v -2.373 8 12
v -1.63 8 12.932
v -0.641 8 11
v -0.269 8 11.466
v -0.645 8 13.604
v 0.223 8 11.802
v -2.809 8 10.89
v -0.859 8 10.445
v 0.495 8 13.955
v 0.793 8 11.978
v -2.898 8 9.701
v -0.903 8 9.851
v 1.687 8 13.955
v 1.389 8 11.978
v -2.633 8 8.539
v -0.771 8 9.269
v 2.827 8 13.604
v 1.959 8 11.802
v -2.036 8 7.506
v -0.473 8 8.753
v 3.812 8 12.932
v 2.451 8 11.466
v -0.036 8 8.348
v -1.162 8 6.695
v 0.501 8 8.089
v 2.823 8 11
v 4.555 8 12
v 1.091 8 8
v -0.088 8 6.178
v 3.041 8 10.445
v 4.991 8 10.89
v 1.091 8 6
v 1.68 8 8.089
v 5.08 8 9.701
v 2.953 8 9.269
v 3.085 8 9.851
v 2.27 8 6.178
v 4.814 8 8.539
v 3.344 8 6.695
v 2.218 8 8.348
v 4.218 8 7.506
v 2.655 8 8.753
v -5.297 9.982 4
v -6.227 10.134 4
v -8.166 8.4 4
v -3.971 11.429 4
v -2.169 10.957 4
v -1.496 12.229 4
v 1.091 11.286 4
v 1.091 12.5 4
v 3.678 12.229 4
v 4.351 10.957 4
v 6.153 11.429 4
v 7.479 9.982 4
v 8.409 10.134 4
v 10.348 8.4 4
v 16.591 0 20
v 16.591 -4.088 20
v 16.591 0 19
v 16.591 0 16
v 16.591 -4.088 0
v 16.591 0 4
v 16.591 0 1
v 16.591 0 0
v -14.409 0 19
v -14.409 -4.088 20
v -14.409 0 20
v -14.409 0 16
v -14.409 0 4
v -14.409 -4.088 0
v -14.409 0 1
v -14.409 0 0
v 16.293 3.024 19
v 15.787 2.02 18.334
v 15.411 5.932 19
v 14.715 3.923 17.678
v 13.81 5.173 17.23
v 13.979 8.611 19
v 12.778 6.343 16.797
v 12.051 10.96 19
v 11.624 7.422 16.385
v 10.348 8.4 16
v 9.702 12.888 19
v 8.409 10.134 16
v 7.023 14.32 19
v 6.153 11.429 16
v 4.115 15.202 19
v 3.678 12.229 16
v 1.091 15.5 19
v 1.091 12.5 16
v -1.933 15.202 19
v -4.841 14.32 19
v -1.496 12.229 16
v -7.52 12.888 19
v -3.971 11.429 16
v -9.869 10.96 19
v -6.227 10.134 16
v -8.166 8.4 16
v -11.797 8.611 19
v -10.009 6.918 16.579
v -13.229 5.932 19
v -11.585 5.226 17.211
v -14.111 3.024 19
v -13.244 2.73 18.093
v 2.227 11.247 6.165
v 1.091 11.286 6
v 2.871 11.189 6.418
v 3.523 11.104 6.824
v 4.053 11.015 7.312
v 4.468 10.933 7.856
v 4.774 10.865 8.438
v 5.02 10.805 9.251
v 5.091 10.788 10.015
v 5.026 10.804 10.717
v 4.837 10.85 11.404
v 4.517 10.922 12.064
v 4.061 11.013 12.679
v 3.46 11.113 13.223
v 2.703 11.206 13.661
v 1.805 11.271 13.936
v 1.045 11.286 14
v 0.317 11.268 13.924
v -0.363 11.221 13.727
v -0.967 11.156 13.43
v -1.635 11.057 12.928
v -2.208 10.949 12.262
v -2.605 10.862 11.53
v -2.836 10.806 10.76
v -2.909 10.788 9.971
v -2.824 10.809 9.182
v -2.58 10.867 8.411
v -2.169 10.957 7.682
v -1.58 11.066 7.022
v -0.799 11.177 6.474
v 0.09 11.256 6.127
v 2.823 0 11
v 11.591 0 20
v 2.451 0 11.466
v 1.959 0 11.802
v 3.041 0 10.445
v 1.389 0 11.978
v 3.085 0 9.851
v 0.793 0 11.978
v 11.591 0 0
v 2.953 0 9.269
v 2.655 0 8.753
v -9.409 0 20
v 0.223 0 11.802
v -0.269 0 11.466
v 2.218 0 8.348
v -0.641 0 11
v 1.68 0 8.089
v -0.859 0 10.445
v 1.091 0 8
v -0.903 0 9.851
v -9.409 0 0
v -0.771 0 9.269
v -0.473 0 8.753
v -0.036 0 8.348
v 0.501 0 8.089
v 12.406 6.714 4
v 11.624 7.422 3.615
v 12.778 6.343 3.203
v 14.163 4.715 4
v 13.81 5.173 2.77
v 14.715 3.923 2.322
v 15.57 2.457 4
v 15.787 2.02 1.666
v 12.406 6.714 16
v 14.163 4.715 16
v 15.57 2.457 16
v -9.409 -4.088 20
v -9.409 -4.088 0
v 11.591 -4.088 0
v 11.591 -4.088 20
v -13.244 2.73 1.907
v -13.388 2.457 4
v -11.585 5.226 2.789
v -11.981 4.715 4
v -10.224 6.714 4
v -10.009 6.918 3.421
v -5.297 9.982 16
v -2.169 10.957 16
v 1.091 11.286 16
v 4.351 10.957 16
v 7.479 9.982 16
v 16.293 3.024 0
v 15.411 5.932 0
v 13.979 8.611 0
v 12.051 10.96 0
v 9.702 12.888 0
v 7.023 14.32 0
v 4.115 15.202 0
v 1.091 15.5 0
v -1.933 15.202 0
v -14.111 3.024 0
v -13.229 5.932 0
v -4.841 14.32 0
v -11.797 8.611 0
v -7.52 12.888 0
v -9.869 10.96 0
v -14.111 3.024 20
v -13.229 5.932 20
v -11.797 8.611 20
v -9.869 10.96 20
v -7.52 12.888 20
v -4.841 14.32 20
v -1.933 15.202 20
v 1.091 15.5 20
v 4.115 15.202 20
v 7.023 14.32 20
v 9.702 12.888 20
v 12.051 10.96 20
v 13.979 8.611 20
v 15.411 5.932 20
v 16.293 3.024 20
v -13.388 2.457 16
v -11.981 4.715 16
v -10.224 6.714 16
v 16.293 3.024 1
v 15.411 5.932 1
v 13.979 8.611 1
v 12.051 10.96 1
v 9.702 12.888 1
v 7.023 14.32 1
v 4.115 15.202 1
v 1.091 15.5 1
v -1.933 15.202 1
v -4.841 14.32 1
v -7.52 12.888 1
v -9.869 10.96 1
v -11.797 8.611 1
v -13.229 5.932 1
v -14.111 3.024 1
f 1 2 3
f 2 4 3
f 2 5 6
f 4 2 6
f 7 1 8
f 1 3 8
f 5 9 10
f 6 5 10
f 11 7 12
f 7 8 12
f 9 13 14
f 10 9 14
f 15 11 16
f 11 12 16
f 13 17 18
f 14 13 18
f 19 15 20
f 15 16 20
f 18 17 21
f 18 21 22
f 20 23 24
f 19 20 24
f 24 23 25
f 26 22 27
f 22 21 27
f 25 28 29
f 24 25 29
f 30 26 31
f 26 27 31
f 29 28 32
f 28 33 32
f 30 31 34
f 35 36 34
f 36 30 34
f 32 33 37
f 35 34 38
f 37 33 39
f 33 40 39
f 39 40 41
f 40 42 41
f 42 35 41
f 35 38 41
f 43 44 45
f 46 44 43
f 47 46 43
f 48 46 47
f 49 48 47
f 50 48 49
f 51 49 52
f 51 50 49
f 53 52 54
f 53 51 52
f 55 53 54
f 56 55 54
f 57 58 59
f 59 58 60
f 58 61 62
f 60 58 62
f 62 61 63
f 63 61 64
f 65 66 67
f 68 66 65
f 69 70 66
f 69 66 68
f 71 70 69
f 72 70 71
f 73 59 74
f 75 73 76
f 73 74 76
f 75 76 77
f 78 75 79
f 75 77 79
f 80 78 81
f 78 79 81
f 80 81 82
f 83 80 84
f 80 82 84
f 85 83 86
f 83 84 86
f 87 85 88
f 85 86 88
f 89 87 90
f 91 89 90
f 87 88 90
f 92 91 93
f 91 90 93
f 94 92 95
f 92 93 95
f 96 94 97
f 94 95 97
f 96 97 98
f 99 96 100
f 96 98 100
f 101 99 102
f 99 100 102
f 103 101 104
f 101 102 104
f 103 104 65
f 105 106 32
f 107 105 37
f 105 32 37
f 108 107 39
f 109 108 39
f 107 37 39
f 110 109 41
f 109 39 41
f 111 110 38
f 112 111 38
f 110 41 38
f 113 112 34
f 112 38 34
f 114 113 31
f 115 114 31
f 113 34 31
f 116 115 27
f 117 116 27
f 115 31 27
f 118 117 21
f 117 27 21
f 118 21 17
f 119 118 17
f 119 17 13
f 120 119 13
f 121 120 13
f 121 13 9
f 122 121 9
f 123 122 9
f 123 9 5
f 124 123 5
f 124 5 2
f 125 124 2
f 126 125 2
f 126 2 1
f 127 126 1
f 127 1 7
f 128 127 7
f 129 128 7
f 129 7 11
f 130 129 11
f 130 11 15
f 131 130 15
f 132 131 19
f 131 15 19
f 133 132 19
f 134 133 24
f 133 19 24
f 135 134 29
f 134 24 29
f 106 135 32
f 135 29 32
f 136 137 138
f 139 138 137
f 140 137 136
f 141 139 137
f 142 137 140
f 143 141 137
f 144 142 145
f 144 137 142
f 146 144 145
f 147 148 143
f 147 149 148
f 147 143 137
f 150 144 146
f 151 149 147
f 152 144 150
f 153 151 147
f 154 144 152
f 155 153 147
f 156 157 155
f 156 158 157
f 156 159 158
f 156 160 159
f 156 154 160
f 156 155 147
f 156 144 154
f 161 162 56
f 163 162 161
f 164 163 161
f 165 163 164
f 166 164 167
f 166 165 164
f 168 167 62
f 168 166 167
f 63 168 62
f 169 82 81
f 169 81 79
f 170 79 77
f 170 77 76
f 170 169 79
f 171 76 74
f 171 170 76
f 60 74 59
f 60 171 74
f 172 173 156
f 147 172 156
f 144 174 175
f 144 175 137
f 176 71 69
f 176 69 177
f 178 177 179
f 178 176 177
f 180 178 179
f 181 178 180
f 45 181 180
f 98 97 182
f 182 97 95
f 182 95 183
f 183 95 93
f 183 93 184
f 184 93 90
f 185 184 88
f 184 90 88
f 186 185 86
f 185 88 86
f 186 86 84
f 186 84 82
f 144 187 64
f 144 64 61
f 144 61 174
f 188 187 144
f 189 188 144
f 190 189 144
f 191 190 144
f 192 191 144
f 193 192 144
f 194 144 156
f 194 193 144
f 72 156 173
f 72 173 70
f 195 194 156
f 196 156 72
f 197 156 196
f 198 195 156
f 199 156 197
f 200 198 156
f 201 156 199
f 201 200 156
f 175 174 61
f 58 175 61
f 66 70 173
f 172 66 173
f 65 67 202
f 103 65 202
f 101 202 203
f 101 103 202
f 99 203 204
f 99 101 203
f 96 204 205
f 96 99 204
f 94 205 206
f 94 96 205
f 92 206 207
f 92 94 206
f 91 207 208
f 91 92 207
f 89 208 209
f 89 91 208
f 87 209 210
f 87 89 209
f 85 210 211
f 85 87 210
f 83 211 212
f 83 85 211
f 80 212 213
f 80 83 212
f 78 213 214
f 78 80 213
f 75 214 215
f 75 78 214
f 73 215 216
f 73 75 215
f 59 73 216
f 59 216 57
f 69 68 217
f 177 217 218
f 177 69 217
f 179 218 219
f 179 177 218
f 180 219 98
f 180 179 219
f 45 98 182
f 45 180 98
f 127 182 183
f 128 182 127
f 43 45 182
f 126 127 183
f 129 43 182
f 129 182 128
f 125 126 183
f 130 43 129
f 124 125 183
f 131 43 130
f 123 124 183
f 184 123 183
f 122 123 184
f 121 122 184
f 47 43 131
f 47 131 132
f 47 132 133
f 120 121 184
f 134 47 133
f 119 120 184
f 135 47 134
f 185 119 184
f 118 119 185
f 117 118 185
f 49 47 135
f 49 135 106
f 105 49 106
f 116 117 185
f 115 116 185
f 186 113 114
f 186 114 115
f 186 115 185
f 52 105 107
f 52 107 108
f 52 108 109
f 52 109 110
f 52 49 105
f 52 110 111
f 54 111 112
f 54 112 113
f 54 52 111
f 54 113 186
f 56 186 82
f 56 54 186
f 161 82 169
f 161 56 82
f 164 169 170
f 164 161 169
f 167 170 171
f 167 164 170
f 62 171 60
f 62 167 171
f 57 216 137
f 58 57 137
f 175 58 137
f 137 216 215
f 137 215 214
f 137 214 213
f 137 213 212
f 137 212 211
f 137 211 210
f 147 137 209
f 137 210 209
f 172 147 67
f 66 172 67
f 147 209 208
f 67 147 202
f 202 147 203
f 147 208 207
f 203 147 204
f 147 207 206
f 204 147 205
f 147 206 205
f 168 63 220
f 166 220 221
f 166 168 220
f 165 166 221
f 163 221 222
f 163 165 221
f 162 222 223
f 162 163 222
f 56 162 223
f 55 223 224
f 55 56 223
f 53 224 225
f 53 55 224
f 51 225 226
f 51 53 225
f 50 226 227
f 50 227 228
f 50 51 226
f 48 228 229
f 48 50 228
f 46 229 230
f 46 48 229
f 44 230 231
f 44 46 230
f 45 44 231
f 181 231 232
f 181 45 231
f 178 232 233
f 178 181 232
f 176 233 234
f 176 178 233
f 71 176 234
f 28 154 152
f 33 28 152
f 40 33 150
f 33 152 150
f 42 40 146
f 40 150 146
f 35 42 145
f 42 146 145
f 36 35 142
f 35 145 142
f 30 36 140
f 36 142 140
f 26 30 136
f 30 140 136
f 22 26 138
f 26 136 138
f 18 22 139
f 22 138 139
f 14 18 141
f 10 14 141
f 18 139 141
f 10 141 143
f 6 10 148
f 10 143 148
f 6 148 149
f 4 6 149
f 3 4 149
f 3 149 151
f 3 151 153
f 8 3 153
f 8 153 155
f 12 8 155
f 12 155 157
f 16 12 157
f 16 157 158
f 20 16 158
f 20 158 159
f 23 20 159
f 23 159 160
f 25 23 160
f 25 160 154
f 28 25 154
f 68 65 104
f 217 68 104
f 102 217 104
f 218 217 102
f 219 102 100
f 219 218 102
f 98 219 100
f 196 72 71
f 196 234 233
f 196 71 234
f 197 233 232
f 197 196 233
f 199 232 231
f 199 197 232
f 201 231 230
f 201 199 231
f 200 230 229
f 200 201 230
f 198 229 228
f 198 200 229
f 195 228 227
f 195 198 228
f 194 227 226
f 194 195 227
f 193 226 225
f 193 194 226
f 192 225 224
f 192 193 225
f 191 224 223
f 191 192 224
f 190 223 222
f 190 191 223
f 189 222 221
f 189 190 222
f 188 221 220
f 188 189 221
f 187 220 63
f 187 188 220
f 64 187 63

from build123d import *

# Parameters (mm, degrees)
ESQUISSE1_W             = 5
ESQUISSE1_H             = 4.088235294
BOSS_EXTRU_1_DEPTH      = 20
ENL_V_START             = -16
ENL_V_MAT_EXTRU_1_DEPTH = 12
CHANFREIN1_SIZE         = 3
ESQUISSE3_R             = 2
ENL_V_MAT_EXTRU_2_DEPTH = 12
ENL_V_START_2           = -8
ESQUISSE4_R             = 4
ENL_V_MAT_EXTRU_3_DEPTH = 12


with BuildPart() as part:
    # Esquisse1 → Boss.-Extru.1 (new body)
    with BuildSketch(Plane.XY):
        with BuildLine():
            ThreePointArc((-14.409025375, 0), (1.090974625, 15.5), (16.590974625, 0))
            Line((16.590974625, 0), (11.590974625, 0))
            Line((11.590974625, 0), (-9.409025375, 0))
            Line((-9.409025375, 0), (-14.409025375, 0))
        make_face()
        with Locations((-11.909025375, -2.044117647)):
            Rectangle(ESQUISSE1_W, ESQUISSE1_H)
        with Locations((14.090974625, -2.044117647)):
            Rectangle(ESQUISSE1_W, ESQUISSE1_H)
    extrude(amount=BOSS_EXTRU_1_DEPTH)

    # Esquisse2 → Enlèv. mat.-Extru.1 (cut)
    with BuildSketch(Plane.XY.offset(20).offset(ENL_V_START)):
        with BuildLine():
            ThreePointArc((-14.409025375, 0), (1.090974625, 11.286497475), (16.590974625, 0))
            ThreePointArc((16.590974625, 0), (1.090974625, 15.5), (-14.409025375, 0))
        make_face()
    extrude(amount=ENL_V_MAT_EXTRU_1_DEPTH, mode=Mode.SUBTRACT)

    # Chanfrein1
    # the kernel refuses this chamfer: 3 mm, written as the material it takes off along each edge
    with BuildSketch(Plane(origin=(1.090974625, 0, 4), x_dir=(0.8782789278300123, -0.4781486431328276, 0), z_dir=(-0.4781486431328276, -0.8782789278300123, 0))) as chanfrein1_piece_1_section:
        Polygon((15.5, -CHANFREIN1_SIZE), (15.5 - CHANFREIN1_SIZE, 0), (15.5, 0), align=None)
    chanfrein1_piece_1 = revolve(axis=Axis((1.090974625, 0, 4), (0, 0, 1)), revolution_arc=237.129113272, mode=Mode.PRIVATE)
    chanfrein1_piece_1 = chanfrein1_piece_1 - Plane(origin=(1.090974625, -5, 2.541086631), x_dir=(-0.9517086177605509, 0.3070027799227584, 0), z_dir=(0, 0, -1)) * Cylinder(16.286497475, 63, mode=Mode.PRIVATE)
    add(chanfrein1_piece_1, mode=Mode.SUBTRACT)
    with BuildSketch(Plane(origin=(1.090974625, 0, 16), x_dir=(0.8782789278300122, -0.4781486431328277, 0), z_dir=(-0.4781486431328277, -0.8782789278300122, 0))) as chanfrein1_piece_2_section:
        Polygon((15.5, CHANFREIN1_SIZE), (15.5 - CHANFREIN1_SIZE, 0), (15.5, 0), align=None)
    chanfrein1_piece_2 = revolve(axis=Axis((1.090974625, 0, 16), (0, 0, 1)), revolution_arc=237.129113272, mode=Mode.PRIVATE)
    chanfrein1_piece_2 = chanfrein1_piece_2 - Plane(origin=(1.090974625, -5, 17.458913369), x_dir=(-0.9517086177605509, 0.3070027799227584, 0), z_dir=(0, 0, -1)) * Cylinder(16.286497475, 62, mode=Mode.PRIVATE)
    add(chanfrein1_piece_2, mode=Mode.SUBTRACT)

    # Esquisse3 → Enlèv. mat.-Extru.2 (cut)
    with BuildSketch(Plane.XZ):
        with Locations(Location((1.090974625, 10, 0), (0, 0, 270))):
            Circle(ESQUISSE3_R)
    extrude(amount=-ENL_V_MAT_EXTRU_2_DEPTH, mode=Mode.SUBTRACT)

    # Esquisse4 → Enlèv. mat.-Extru.3 (cut)
    with BuildSketch(Plane.XZ.offset(ENL_V_START_2)):
        with Locations(Location((1.090974625, 10, 0), (0, 0, 270))):
            Circle(ESQUISSE4_R)
    extrude(amount=-ENL_V_MAT_EXTRU_3_DEPTH, mode=Mode.SUBTRACT)


solid = part.part
